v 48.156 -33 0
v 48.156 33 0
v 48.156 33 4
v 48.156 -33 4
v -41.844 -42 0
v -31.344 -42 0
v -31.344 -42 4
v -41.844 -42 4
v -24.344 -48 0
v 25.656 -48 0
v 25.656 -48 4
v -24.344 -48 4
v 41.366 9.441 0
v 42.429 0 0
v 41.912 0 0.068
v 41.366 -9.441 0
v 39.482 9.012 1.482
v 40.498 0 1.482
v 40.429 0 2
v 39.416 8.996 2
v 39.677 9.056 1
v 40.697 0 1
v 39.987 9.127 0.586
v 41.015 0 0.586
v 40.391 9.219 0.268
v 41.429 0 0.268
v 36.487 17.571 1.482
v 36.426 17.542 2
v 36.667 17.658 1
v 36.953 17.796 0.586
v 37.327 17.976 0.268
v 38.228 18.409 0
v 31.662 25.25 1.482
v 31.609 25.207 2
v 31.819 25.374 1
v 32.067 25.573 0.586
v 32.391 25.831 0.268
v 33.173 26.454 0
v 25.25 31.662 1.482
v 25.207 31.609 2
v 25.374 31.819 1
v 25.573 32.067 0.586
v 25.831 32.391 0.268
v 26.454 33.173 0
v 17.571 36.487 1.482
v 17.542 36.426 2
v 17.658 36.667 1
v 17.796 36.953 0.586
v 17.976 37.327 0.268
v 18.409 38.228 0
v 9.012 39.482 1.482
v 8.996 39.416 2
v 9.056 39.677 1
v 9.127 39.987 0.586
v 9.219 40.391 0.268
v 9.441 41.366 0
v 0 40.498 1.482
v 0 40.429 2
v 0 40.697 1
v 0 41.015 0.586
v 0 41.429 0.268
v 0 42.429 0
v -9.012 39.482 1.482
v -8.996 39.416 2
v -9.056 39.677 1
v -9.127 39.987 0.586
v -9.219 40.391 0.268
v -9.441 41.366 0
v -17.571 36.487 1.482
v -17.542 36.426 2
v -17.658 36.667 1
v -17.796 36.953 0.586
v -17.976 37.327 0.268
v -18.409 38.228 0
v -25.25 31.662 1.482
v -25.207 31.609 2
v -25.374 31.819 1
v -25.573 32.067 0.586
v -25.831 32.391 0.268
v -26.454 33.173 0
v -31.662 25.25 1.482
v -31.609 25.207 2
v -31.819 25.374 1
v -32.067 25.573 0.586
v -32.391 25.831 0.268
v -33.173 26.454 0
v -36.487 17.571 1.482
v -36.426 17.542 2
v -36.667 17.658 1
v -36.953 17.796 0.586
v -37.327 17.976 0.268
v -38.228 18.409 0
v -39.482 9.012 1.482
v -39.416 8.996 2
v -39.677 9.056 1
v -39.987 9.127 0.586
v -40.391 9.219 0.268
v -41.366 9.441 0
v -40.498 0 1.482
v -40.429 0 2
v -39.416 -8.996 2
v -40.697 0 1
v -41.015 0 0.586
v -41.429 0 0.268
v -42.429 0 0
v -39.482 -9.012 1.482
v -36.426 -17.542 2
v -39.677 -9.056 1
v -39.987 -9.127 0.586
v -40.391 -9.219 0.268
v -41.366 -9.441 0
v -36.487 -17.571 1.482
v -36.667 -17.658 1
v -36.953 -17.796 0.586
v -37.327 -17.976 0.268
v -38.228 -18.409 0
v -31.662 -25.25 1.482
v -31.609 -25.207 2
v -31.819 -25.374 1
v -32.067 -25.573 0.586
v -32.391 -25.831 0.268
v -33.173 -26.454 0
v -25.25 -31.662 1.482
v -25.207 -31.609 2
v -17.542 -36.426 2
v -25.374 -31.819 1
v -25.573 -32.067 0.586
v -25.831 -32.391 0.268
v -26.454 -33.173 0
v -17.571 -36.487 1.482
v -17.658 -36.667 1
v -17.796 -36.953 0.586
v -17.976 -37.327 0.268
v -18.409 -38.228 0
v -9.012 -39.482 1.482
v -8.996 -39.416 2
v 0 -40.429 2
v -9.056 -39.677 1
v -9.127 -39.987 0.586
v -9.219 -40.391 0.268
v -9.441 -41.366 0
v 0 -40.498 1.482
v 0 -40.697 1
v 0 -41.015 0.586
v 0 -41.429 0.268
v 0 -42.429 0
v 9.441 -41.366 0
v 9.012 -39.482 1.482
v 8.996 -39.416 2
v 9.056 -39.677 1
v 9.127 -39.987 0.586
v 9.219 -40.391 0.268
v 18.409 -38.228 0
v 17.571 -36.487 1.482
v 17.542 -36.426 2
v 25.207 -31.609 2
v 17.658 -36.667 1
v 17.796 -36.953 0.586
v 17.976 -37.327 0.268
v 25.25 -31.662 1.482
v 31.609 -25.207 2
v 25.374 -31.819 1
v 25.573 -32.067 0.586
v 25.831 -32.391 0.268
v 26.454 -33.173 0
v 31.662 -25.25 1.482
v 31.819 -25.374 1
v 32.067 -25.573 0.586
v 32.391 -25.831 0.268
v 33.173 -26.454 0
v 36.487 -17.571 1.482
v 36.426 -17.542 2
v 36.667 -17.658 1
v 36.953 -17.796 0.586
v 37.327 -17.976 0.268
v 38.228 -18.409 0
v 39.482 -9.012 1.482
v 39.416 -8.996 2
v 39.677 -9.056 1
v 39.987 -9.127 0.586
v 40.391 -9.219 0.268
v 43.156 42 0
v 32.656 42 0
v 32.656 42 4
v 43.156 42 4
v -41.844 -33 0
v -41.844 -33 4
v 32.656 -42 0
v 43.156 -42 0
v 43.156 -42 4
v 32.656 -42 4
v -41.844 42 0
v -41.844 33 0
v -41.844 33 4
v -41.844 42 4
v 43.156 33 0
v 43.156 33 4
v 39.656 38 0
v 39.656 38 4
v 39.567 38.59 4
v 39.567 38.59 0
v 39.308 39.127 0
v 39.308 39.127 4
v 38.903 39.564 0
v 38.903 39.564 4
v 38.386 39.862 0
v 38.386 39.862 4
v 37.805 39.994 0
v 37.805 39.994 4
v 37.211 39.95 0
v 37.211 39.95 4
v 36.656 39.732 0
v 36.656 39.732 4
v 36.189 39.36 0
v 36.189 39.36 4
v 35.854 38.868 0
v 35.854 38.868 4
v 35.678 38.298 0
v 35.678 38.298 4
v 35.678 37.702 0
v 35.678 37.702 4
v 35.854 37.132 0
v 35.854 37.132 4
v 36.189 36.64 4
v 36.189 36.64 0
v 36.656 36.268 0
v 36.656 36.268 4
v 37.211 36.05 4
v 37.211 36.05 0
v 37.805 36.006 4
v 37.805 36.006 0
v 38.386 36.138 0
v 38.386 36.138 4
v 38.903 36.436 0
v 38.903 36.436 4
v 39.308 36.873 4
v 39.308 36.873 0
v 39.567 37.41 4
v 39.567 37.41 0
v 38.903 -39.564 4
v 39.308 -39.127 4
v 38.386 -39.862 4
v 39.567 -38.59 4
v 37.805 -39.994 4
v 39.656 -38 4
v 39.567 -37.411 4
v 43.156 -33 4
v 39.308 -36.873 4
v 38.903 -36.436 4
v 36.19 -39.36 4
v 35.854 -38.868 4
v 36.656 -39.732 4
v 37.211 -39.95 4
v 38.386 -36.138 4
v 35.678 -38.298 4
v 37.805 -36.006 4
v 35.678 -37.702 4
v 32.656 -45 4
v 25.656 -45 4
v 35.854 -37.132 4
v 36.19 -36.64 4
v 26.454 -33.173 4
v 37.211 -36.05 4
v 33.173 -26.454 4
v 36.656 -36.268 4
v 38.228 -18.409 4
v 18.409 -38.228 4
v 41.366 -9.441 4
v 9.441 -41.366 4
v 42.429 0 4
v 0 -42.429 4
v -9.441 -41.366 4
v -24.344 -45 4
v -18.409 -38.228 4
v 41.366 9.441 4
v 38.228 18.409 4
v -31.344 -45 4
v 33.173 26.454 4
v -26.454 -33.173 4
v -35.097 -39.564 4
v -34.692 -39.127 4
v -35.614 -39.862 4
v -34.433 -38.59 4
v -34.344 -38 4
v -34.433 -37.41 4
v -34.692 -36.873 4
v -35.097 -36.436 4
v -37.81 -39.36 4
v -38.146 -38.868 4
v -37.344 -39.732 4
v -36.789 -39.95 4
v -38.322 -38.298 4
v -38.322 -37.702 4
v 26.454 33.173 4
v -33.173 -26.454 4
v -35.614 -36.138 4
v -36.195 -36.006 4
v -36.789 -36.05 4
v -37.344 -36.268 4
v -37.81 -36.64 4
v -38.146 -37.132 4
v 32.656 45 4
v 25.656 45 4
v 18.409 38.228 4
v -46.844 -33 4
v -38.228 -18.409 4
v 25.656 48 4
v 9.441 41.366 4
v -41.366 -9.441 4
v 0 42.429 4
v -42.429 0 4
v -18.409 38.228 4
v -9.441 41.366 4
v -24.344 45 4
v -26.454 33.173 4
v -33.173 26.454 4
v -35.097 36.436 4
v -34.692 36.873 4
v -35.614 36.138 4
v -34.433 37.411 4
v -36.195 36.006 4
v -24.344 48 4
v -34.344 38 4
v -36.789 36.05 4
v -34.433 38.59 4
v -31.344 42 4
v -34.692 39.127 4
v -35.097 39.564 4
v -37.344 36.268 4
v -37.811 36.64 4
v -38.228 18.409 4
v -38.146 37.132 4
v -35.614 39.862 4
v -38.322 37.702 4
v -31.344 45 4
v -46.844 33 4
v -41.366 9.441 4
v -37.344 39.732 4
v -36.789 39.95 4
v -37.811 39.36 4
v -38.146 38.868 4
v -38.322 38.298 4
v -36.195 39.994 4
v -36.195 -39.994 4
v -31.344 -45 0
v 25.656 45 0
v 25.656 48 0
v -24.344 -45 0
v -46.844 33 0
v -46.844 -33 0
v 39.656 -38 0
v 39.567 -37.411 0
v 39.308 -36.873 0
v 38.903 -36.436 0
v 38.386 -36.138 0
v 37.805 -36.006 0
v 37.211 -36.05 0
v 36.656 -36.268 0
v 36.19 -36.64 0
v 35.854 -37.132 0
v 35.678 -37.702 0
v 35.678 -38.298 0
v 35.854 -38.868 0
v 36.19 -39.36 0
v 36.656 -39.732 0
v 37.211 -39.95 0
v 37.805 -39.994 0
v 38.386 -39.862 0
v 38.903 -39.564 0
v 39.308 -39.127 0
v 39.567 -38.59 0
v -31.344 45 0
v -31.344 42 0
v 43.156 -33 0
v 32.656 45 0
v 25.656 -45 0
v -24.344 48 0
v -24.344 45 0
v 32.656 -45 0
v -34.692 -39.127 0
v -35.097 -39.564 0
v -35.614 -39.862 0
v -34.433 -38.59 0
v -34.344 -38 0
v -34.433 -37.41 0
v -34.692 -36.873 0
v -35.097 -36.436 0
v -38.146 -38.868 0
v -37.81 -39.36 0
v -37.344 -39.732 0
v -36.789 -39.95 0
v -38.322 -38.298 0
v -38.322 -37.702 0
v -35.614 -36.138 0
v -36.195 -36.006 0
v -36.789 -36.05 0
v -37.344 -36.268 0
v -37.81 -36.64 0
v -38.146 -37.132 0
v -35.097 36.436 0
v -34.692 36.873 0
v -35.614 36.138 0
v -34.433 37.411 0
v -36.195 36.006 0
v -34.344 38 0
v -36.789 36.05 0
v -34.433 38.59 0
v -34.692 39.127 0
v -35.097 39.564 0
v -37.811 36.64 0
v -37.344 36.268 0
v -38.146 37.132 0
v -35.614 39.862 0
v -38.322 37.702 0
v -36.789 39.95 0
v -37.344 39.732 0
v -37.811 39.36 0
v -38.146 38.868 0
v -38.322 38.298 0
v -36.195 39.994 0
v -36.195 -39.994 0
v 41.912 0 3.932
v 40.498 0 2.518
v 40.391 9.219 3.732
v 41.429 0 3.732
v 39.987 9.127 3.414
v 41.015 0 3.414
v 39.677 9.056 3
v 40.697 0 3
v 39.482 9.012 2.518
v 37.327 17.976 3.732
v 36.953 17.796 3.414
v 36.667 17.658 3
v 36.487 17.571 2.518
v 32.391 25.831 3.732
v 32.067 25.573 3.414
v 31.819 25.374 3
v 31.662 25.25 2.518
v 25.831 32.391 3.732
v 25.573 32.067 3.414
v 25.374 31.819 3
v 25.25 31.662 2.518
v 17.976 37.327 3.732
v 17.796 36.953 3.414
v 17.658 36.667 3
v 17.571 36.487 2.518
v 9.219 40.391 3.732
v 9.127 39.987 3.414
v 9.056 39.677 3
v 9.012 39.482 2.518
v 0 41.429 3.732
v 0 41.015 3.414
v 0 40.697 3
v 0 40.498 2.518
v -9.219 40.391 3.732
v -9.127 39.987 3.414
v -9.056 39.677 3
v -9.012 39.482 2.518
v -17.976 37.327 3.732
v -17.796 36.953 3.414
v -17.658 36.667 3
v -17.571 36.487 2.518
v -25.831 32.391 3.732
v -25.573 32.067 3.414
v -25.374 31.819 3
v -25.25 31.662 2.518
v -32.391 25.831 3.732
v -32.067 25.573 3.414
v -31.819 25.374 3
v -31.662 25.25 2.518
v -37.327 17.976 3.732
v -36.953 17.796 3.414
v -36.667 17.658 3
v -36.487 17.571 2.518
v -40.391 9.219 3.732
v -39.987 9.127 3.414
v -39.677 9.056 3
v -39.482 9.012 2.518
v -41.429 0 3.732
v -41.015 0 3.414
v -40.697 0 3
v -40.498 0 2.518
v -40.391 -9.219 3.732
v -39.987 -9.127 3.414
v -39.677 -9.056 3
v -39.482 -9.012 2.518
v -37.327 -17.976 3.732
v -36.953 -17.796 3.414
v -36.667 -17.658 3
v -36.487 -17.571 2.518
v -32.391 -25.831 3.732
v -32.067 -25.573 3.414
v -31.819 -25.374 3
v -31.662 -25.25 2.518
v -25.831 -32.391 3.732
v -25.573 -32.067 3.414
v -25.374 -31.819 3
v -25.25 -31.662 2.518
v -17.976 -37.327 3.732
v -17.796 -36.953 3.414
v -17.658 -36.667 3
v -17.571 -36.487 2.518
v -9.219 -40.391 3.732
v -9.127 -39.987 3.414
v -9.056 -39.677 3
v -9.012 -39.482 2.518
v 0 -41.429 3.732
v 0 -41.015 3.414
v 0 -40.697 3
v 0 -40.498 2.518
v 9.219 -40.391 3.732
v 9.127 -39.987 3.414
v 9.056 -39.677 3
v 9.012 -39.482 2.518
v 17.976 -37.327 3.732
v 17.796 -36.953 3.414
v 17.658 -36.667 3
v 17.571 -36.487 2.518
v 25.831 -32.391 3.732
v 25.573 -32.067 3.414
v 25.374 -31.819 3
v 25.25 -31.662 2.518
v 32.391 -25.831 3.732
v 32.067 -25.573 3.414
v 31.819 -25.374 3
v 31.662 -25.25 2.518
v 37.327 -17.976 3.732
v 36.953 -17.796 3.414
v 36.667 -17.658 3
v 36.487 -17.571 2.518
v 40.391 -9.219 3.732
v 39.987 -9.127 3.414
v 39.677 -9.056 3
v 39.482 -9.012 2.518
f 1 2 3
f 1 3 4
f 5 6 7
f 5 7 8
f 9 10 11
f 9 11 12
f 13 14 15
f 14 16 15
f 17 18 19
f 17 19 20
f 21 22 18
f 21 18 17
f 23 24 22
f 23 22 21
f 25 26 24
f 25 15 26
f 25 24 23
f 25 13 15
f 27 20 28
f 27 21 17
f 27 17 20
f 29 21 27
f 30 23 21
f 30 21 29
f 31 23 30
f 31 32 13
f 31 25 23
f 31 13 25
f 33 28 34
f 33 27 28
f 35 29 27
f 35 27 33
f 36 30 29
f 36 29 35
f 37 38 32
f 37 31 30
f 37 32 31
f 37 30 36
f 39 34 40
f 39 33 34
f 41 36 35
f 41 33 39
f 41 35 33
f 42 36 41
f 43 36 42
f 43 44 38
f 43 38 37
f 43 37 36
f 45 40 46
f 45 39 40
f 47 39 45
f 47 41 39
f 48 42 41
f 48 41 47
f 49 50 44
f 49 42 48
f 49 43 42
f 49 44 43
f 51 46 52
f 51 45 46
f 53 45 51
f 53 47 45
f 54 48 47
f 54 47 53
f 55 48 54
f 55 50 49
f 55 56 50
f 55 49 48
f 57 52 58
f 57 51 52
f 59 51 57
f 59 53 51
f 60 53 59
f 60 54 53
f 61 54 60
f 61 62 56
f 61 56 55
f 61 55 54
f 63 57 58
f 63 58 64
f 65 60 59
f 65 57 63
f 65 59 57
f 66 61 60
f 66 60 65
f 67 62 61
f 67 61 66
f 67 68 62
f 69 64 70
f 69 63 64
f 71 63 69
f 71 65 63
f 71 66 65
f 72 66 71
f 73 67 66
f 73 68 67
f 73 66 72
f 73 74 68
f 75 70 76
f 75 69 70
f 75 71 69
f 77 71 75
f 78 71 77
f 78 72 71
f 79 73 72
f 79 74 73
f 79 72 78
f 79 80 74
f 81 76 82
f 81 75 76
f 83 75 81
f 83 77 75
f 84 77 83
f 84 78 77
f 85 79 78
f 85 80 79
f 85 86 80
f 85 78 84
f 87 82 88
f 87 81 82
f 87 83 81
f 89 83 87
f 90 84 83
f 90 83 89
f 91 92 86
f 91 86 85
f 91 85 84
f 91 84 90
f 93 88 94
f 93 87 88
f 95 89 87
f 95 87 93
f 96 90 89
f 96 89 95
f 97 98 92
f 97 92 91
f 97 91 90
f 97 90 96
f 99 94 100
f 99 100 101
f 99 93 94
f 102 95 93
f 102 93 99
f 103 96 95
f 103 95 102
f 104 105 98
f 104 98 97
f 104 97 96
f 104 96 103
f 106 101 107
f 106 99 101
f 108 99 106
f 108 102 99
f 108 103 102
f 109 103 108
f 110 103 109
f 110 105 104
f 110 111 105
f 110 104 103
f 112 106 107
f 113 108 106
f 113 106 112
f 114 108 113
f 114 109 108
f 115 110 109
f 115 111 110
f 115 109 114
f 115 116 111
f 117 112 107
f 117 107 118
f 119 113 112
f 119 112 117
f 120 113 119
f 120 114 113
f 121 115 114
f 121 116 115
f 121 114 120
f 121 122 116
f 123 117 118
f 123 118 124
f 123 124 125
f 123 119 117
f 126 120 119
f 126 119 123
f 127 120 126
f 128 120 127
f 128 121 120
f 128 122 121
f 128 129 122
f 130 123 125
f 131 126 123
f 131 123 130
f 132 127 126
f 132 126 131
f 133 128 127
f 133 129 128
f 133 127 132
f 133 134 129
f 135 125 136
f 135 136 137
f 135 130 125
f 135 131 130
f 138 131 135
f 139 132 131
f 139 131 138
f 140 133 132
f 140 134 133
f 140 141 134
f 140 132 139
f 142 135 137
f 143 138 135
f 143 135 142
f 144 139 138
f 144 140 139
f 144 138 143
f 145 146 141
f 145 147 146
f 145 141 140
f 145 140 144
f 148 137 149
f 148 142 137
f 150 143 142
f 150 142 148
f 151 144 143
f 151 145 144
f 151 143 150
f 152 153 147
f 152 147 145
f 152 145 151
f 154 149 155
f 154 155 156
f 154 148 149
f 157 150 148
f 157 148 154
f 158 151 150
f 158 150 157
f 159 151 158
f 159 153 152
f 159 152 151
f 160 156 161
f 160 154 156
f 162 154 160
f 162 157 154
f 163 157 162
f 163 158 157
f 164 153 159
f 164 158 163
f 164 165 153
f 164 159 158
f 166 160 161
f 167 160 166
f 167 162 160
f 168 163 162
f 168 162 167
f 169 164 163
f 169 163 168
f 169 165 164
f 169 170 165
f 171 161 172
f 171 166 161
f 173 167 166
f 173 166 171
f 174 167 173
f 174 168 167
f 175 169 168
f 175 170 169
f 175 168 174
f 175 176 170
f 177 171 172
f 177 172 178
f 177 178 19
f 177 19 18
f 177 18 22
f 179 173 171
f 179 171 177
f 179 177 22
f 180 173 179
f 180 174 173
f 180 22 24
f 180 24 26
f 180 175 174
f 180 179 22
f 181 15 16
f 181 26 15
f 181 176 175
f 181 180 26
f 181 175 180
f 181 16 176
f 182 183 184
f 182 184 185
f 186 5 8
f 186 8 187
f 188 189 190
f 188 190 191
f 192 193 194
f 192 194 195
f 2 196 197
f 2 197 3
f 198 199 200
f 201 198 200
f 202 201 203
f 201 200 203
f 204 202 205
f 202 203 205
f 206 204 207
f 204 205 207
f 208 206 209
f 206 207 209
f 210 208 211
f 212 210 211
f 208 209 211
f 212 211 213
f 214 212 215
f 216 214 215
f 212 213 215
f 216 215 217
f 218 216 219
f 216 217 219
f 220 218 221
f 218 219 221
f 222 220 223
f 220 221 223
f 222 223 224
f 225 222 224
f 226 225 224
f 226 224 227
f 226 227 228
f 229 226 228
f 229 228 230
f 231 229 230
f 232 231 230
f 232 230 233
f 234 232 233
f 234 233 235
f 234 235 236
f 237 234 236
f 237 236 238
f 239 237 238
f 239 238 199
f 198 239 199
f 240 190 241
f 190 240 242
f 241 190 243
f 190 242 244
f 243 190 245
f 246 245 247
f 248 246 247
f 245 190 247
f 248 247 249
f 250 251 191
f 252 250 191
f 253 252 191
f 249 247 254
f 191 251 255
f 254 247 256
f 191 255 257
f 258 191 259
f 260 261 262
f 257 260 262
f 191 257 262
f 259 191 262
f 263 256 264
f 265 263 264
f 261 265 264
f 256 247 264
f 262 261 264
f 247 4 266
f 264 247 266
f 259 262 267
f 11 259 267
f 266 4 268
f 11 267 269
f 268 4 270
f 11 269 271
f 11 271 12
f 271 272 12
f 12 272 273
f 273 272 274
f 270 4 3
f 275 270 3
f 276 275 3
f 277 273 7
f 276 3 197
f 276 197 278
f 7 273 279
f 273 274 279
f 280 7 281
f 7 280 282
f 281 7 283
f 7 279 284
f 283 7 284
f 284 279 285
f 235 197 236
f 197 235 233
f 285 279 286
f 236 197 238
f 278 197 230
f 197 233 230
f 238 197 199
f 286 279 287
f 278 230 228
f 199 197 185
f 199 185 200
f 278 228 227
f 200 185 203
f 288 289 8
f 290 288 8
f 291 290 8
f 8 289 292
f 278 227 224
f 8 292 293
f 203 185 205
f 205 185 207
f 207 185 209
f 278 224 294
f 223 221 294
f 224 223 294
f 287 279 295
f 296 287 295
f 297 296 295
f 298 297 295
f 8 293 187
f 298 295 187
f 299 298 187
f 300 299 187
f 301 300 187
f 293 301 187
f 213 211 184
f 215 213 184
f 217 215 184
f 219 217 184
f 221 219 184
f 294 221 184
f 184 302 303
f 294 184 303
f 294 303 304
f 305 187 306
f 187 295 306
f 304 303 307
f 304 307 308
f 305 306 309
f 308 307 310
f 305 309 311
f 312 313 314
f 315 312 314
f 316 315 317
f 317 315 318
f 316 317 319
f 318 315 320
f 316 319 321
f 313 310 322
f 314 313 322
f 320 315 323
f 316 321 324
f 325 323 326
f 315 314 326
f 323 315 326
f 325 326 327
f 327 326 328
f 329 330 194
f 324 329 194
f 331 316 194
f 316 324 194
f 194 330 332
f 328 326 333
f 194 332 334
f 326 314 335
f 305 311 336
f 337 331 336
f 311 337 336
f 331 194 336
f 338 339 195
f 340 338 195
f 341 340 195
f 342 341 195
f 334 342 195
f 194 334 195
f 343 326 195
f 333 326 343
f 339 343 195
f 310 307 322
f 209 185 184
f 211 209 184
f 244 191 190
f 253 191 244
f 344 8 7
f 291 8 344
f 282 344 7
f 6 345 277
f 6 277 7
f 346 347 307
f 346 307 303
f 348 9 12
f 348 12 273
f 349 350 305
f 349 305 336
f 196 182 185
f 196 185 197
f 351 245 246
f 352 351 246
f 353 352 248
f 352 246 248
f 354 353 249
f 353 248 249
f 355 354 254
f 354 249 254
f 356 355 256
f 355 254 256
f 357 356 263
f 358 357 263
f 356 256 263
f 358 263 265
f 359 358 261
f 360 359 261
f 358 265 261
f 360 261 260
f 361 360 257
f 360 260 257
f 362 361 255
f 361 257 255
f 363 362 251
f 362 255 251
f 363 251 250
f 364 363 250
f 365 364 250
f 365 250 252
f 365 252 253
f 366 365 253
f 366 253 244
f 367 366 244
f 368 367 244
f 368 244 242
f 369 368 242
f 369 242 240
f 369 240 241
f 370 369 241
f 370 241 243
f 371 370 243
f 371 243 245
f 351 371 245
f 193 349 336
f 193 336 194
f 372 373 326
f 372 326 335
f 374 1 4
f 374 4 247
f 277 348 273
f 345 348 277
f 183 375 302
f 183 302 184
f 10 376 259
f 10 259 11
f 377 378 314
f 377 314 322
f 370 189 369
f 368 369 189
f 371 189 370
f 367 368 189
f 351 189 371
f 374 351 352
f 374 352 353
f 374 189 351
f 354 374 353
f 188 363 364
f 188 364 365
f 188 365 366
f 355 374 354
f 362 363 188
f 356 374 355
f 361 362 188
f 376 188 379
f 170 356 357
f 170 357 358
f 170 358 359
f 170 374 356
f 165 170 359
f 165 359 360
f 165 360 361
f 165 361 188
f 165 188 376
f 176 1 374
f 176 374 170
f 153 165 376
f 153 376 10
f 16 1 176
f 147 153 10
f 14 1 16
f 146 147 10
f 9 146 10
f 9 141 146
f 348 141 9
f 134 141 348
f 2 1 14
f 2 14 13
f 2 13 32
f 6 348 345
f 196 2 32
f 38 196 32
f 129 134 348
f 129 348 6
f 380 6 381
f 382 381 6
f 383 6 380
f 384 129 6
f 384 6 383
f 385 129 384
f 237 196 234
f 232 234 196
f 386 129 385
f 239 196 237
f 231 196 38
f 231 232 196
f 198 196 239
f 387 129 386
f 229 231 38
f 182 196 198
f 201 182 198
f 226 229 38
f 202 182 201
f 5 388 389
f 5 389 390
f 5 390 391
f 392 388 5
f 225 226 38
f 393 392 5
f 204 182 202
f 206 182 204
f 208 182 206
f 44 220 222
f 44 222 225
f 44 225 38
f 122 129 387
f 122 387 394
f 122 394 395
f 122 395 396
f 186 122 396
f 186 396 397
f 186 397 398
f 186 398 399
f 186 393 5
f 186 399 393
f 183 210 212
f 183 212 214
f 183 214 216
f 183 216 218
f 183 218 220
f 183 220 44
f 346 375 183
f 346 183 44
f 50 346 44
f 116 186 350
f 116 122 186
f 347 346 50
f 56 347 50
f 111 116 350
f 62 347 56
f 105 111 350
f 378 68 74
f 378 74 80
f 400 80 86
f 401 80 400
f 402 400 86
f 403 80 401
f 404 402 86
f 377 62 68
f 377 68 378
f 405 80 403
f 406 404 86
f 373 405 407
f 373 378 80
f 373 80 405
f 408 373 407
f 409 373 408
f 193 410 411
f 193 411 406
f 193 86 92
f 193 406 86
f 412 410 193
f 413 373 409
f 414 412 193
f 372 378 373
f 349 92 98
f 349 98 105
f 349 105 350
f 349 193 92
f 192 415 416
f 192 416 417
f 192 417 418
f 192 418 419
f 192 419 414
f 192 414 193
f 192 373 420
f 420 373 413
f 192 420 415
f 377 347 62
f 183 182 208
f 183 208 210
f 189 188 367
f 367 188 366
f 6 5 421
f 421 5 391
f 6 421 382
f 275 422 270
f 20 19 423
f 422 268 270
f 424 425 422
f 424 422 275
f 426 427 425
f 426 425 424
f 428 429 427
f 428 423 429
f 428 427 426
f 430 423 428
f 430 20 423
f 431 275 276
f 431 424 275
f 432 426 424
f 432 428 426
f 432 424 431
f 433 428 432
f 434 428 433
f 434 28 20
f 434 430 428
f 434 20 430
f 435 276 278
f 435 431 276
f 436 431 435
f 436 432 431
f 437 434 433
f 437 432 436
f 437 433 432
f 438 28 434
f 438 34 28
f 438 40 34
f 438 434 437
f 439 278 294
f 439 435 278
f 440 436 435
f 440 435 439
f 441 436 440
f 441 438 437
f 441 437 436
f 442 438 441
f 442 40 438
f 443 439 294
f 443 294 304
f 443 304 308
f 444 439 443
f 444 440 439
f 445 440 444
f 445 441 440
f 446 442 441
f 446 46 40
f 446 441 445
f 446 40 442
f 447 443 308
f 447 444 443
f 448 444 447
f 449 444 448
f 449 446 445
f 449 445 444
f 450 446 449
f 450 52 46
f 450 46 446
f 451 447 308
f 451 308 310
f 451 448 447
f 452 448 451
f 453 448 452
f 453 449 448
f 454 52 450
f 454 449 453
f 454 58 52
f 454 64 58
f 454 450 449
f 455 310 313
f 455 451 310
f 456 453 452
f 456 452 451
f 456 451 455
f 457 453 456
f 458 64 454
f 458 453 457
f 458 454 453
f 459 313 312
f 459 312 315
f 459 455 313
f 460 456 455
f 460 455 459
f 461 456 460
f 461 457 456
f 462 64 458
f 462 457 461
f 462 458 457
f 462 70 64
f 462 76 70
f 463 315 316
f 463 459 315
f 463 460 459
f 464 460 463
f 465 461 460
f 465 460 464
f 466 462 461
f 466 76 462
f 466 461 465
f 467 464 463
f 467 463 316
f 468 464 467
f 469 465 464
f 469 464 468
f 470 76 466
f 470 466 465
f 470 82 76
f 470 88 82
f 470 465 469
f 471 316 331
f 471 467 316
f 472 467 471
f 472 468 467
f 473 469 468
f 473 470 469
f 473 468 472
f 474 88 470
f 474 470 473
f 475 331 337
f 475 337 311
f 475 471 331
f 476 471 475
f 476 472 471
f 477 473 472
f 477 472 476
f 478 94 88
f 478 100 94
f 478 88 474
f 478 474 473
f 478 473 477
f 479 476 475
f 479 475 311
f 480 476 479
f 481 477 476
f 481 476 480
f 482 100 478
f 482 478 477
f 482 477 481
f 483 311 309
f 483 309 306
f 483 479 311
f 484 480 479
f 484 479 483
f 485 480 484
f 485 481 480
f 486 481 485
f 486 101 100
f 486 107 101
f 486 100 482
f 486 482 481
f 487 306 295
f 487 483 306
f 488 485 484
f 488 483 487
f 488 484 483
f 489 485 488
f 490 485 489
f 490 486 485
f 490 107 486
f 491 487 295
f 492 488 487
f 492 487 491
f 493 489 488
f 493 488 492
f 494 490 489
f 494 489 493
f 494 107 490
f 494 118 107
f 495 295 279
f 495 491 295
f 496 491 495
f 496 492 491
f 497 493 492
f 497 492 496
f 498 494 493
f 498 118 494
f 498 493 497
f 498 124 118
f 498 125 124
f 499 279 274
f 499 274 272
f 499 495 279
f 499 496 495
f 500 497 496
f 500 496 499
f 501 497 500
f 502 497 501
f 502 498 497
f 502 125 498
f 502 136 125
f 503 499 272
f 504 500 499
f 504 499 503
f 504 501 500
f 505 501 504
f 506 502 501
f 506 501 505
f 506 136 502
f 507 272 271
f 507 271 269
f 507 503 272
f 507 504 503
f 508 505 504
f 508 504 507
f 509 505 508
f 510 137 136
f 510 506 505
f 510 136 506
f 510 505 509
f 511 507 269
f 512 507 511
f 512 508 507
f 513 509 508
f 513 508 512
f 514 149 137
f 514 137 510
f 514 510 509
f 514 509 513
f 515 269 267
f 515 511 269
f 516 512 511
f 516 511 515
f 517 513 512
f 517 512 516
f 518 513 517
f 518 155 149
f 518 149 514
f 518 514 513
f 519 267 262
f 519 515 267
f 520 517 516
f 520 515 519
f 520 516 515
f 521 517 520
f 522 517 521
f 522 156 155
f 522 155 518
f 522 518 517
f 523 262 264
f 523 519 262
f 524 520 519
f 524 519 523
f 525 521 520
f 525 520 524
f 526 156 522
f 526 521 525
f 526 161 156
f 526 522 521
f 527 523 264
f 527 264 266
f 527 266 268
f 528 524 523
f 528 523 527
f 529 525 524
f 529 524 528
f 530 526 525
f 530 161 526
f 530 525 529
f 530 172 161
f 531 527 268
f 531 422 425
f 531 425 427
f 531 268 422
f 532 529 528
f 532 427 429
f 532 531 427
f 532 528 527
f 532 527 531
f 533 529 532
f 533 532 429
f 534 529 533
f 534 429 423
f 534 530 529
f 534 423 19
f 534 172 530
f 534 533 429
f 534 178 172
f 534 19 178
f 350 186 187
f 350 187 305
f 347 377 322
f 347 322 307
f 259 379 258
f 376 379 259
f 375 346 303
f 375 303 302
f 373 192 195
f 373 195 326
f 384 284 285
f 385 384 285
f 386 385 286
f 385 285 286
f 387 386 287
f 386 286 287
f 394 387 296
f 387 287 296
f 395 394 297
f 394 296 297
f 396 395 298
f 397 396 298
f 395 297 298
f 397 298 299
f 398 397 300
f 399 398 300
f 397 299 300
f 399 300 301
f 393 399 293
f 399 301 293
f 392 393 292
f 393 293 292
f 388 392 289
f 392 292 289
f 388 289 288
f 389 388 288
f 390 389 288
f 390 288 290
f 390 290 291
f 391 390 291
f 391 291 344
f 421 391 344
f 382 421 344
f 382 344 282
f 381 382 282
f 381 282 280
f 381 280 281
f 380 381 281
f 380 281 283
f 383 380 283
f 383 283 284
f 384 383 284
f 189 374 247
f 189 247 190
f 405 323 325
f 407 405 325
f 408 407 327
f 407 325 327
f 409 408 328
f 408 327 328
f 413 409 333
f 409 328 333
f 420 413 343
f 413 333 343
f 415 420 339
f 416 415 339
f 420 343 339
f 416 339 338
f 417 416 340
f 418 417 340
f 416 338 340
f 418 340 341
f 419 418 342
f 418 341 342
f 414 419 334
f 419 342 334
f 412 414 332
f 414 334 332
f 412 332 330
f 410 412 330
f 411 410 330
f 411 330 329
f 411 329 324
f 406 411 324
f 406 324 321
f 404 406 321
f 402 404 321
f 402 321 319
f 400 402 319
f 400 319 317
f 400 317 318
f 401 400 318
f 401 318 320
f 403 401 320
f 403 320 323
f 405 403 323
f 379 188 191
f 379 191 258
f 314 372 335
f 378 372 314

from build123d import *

# Parameters (mm, degrees)
BOSS_EXTRUDE1_DEPTH = 4
SKETCH2_R           = 2
CUT_EXTRUDE1_DEPTH  = 10
SKETCH3_R           = 30
CUT_EXTRUDE2_DEPTH  = 10
SKETCH4_R           = 40.429464175
CUT_EXTRUDE3_DEPTH  = 69.109947193
FILLET5_R           = 2
FILLET6_R           = 2


with BuildPart() as part:
    # Sketch1 → Boss-Extrude1 (new body)
    with BuildSketch(Plane.XY):
        Polygon((-46.844369636, 32.999996521), (-41.844369636, 32.999996711), (-41.844366793, 42.000003289), (-31.344369977, 41.999997109), (-31.344370091, 44.999997109), (-24.344370091, 44.999997374), (-24.344370205, 47.999997374), (25.655629795, 47.99999927), (25.655629909, 44.99999927), (32.655629909, 44.999999535), (32.655630023, 41.999999535), (43.155633207, 42.000000067), (43.155630364, 32.999999933), (48.155630364, 33.000000123), (48.155632866, -32.999999877), (43.155630364, -32.999999933), (43.155633207, -42.000000067), (32.655630023, -41.999999535), (32.655629909, -44.999999535), (25.655629909, -44.99999927), (25.655629795, -47.99999927), (-24.344370205, -47.999997374), (-24.344370091, -44.999997374), (-31.344370091, -44.999997109), (-31.344369977, -41.999997109), (-41.844366793, -42.000003289), (-41.844369636, -32.999996711), (-46.844369636, -32.999996521), align=None)
    extrude(amount=BOSS_EXTRUDE1_DEPTH)

    # Sketch2 → Cut-Extrude1 (cut)
    with BuildSketch(Plane.XY.offset(4)):
        with Locations((-36.344424402, 38.000040227)):
            Circle(SKETCH2_R)
        with Locations((37.655687631, -38.000043584)):
            Circle(SKETCH2_R)
        with Locations((37.655603638, 37.999999725)):
            Circle(SKETCH2_R)
        with Locations((-36.344340408, -38.000003081)):
            Circle(SKETCH2_R)
    extrude(amount=-CUT_EXTRUDE1_DEPTH, mode=Mode.SUBTRACT)

    # Sketch3 → Cut-Extrude2 (cut)
    with BuildSketch(Plane.XY.offset(4)):
        Circle(SKETCH3_R)
    extrude(amount=-CUT_EXTRUDE2_DEPTH, mode=Mode.SUBTRACT)

    # Sketch4 → Cut-Extrude3 (cut, through all)
    with BuildSketch(Plane.XY.offset(4)):
        Circle(SKETCH4_R)
    extrude(amount=-CUT_EXTRUDE3_DEPTH, mode=Mode.SUBTRACT)

    # Fillet5
    fillet5_edges = [part.edges().sort_by_distance(p)[0] for p in [
        (-40.429464175, 0, 4),
    ]]
    fillet(fillet5_edges, radius=FILLET5_R)

    # Fillet6
    fillet6_edges = [part.edges().sort_by_distance(p)[0] for p in [
        (-40.429464175, 0, 0),
    ]]
    fillet(fillet6_edges, radius=FILLET6_R - 0.0001)  # a hair under: the kernel refuses the full size


solid = part.part
